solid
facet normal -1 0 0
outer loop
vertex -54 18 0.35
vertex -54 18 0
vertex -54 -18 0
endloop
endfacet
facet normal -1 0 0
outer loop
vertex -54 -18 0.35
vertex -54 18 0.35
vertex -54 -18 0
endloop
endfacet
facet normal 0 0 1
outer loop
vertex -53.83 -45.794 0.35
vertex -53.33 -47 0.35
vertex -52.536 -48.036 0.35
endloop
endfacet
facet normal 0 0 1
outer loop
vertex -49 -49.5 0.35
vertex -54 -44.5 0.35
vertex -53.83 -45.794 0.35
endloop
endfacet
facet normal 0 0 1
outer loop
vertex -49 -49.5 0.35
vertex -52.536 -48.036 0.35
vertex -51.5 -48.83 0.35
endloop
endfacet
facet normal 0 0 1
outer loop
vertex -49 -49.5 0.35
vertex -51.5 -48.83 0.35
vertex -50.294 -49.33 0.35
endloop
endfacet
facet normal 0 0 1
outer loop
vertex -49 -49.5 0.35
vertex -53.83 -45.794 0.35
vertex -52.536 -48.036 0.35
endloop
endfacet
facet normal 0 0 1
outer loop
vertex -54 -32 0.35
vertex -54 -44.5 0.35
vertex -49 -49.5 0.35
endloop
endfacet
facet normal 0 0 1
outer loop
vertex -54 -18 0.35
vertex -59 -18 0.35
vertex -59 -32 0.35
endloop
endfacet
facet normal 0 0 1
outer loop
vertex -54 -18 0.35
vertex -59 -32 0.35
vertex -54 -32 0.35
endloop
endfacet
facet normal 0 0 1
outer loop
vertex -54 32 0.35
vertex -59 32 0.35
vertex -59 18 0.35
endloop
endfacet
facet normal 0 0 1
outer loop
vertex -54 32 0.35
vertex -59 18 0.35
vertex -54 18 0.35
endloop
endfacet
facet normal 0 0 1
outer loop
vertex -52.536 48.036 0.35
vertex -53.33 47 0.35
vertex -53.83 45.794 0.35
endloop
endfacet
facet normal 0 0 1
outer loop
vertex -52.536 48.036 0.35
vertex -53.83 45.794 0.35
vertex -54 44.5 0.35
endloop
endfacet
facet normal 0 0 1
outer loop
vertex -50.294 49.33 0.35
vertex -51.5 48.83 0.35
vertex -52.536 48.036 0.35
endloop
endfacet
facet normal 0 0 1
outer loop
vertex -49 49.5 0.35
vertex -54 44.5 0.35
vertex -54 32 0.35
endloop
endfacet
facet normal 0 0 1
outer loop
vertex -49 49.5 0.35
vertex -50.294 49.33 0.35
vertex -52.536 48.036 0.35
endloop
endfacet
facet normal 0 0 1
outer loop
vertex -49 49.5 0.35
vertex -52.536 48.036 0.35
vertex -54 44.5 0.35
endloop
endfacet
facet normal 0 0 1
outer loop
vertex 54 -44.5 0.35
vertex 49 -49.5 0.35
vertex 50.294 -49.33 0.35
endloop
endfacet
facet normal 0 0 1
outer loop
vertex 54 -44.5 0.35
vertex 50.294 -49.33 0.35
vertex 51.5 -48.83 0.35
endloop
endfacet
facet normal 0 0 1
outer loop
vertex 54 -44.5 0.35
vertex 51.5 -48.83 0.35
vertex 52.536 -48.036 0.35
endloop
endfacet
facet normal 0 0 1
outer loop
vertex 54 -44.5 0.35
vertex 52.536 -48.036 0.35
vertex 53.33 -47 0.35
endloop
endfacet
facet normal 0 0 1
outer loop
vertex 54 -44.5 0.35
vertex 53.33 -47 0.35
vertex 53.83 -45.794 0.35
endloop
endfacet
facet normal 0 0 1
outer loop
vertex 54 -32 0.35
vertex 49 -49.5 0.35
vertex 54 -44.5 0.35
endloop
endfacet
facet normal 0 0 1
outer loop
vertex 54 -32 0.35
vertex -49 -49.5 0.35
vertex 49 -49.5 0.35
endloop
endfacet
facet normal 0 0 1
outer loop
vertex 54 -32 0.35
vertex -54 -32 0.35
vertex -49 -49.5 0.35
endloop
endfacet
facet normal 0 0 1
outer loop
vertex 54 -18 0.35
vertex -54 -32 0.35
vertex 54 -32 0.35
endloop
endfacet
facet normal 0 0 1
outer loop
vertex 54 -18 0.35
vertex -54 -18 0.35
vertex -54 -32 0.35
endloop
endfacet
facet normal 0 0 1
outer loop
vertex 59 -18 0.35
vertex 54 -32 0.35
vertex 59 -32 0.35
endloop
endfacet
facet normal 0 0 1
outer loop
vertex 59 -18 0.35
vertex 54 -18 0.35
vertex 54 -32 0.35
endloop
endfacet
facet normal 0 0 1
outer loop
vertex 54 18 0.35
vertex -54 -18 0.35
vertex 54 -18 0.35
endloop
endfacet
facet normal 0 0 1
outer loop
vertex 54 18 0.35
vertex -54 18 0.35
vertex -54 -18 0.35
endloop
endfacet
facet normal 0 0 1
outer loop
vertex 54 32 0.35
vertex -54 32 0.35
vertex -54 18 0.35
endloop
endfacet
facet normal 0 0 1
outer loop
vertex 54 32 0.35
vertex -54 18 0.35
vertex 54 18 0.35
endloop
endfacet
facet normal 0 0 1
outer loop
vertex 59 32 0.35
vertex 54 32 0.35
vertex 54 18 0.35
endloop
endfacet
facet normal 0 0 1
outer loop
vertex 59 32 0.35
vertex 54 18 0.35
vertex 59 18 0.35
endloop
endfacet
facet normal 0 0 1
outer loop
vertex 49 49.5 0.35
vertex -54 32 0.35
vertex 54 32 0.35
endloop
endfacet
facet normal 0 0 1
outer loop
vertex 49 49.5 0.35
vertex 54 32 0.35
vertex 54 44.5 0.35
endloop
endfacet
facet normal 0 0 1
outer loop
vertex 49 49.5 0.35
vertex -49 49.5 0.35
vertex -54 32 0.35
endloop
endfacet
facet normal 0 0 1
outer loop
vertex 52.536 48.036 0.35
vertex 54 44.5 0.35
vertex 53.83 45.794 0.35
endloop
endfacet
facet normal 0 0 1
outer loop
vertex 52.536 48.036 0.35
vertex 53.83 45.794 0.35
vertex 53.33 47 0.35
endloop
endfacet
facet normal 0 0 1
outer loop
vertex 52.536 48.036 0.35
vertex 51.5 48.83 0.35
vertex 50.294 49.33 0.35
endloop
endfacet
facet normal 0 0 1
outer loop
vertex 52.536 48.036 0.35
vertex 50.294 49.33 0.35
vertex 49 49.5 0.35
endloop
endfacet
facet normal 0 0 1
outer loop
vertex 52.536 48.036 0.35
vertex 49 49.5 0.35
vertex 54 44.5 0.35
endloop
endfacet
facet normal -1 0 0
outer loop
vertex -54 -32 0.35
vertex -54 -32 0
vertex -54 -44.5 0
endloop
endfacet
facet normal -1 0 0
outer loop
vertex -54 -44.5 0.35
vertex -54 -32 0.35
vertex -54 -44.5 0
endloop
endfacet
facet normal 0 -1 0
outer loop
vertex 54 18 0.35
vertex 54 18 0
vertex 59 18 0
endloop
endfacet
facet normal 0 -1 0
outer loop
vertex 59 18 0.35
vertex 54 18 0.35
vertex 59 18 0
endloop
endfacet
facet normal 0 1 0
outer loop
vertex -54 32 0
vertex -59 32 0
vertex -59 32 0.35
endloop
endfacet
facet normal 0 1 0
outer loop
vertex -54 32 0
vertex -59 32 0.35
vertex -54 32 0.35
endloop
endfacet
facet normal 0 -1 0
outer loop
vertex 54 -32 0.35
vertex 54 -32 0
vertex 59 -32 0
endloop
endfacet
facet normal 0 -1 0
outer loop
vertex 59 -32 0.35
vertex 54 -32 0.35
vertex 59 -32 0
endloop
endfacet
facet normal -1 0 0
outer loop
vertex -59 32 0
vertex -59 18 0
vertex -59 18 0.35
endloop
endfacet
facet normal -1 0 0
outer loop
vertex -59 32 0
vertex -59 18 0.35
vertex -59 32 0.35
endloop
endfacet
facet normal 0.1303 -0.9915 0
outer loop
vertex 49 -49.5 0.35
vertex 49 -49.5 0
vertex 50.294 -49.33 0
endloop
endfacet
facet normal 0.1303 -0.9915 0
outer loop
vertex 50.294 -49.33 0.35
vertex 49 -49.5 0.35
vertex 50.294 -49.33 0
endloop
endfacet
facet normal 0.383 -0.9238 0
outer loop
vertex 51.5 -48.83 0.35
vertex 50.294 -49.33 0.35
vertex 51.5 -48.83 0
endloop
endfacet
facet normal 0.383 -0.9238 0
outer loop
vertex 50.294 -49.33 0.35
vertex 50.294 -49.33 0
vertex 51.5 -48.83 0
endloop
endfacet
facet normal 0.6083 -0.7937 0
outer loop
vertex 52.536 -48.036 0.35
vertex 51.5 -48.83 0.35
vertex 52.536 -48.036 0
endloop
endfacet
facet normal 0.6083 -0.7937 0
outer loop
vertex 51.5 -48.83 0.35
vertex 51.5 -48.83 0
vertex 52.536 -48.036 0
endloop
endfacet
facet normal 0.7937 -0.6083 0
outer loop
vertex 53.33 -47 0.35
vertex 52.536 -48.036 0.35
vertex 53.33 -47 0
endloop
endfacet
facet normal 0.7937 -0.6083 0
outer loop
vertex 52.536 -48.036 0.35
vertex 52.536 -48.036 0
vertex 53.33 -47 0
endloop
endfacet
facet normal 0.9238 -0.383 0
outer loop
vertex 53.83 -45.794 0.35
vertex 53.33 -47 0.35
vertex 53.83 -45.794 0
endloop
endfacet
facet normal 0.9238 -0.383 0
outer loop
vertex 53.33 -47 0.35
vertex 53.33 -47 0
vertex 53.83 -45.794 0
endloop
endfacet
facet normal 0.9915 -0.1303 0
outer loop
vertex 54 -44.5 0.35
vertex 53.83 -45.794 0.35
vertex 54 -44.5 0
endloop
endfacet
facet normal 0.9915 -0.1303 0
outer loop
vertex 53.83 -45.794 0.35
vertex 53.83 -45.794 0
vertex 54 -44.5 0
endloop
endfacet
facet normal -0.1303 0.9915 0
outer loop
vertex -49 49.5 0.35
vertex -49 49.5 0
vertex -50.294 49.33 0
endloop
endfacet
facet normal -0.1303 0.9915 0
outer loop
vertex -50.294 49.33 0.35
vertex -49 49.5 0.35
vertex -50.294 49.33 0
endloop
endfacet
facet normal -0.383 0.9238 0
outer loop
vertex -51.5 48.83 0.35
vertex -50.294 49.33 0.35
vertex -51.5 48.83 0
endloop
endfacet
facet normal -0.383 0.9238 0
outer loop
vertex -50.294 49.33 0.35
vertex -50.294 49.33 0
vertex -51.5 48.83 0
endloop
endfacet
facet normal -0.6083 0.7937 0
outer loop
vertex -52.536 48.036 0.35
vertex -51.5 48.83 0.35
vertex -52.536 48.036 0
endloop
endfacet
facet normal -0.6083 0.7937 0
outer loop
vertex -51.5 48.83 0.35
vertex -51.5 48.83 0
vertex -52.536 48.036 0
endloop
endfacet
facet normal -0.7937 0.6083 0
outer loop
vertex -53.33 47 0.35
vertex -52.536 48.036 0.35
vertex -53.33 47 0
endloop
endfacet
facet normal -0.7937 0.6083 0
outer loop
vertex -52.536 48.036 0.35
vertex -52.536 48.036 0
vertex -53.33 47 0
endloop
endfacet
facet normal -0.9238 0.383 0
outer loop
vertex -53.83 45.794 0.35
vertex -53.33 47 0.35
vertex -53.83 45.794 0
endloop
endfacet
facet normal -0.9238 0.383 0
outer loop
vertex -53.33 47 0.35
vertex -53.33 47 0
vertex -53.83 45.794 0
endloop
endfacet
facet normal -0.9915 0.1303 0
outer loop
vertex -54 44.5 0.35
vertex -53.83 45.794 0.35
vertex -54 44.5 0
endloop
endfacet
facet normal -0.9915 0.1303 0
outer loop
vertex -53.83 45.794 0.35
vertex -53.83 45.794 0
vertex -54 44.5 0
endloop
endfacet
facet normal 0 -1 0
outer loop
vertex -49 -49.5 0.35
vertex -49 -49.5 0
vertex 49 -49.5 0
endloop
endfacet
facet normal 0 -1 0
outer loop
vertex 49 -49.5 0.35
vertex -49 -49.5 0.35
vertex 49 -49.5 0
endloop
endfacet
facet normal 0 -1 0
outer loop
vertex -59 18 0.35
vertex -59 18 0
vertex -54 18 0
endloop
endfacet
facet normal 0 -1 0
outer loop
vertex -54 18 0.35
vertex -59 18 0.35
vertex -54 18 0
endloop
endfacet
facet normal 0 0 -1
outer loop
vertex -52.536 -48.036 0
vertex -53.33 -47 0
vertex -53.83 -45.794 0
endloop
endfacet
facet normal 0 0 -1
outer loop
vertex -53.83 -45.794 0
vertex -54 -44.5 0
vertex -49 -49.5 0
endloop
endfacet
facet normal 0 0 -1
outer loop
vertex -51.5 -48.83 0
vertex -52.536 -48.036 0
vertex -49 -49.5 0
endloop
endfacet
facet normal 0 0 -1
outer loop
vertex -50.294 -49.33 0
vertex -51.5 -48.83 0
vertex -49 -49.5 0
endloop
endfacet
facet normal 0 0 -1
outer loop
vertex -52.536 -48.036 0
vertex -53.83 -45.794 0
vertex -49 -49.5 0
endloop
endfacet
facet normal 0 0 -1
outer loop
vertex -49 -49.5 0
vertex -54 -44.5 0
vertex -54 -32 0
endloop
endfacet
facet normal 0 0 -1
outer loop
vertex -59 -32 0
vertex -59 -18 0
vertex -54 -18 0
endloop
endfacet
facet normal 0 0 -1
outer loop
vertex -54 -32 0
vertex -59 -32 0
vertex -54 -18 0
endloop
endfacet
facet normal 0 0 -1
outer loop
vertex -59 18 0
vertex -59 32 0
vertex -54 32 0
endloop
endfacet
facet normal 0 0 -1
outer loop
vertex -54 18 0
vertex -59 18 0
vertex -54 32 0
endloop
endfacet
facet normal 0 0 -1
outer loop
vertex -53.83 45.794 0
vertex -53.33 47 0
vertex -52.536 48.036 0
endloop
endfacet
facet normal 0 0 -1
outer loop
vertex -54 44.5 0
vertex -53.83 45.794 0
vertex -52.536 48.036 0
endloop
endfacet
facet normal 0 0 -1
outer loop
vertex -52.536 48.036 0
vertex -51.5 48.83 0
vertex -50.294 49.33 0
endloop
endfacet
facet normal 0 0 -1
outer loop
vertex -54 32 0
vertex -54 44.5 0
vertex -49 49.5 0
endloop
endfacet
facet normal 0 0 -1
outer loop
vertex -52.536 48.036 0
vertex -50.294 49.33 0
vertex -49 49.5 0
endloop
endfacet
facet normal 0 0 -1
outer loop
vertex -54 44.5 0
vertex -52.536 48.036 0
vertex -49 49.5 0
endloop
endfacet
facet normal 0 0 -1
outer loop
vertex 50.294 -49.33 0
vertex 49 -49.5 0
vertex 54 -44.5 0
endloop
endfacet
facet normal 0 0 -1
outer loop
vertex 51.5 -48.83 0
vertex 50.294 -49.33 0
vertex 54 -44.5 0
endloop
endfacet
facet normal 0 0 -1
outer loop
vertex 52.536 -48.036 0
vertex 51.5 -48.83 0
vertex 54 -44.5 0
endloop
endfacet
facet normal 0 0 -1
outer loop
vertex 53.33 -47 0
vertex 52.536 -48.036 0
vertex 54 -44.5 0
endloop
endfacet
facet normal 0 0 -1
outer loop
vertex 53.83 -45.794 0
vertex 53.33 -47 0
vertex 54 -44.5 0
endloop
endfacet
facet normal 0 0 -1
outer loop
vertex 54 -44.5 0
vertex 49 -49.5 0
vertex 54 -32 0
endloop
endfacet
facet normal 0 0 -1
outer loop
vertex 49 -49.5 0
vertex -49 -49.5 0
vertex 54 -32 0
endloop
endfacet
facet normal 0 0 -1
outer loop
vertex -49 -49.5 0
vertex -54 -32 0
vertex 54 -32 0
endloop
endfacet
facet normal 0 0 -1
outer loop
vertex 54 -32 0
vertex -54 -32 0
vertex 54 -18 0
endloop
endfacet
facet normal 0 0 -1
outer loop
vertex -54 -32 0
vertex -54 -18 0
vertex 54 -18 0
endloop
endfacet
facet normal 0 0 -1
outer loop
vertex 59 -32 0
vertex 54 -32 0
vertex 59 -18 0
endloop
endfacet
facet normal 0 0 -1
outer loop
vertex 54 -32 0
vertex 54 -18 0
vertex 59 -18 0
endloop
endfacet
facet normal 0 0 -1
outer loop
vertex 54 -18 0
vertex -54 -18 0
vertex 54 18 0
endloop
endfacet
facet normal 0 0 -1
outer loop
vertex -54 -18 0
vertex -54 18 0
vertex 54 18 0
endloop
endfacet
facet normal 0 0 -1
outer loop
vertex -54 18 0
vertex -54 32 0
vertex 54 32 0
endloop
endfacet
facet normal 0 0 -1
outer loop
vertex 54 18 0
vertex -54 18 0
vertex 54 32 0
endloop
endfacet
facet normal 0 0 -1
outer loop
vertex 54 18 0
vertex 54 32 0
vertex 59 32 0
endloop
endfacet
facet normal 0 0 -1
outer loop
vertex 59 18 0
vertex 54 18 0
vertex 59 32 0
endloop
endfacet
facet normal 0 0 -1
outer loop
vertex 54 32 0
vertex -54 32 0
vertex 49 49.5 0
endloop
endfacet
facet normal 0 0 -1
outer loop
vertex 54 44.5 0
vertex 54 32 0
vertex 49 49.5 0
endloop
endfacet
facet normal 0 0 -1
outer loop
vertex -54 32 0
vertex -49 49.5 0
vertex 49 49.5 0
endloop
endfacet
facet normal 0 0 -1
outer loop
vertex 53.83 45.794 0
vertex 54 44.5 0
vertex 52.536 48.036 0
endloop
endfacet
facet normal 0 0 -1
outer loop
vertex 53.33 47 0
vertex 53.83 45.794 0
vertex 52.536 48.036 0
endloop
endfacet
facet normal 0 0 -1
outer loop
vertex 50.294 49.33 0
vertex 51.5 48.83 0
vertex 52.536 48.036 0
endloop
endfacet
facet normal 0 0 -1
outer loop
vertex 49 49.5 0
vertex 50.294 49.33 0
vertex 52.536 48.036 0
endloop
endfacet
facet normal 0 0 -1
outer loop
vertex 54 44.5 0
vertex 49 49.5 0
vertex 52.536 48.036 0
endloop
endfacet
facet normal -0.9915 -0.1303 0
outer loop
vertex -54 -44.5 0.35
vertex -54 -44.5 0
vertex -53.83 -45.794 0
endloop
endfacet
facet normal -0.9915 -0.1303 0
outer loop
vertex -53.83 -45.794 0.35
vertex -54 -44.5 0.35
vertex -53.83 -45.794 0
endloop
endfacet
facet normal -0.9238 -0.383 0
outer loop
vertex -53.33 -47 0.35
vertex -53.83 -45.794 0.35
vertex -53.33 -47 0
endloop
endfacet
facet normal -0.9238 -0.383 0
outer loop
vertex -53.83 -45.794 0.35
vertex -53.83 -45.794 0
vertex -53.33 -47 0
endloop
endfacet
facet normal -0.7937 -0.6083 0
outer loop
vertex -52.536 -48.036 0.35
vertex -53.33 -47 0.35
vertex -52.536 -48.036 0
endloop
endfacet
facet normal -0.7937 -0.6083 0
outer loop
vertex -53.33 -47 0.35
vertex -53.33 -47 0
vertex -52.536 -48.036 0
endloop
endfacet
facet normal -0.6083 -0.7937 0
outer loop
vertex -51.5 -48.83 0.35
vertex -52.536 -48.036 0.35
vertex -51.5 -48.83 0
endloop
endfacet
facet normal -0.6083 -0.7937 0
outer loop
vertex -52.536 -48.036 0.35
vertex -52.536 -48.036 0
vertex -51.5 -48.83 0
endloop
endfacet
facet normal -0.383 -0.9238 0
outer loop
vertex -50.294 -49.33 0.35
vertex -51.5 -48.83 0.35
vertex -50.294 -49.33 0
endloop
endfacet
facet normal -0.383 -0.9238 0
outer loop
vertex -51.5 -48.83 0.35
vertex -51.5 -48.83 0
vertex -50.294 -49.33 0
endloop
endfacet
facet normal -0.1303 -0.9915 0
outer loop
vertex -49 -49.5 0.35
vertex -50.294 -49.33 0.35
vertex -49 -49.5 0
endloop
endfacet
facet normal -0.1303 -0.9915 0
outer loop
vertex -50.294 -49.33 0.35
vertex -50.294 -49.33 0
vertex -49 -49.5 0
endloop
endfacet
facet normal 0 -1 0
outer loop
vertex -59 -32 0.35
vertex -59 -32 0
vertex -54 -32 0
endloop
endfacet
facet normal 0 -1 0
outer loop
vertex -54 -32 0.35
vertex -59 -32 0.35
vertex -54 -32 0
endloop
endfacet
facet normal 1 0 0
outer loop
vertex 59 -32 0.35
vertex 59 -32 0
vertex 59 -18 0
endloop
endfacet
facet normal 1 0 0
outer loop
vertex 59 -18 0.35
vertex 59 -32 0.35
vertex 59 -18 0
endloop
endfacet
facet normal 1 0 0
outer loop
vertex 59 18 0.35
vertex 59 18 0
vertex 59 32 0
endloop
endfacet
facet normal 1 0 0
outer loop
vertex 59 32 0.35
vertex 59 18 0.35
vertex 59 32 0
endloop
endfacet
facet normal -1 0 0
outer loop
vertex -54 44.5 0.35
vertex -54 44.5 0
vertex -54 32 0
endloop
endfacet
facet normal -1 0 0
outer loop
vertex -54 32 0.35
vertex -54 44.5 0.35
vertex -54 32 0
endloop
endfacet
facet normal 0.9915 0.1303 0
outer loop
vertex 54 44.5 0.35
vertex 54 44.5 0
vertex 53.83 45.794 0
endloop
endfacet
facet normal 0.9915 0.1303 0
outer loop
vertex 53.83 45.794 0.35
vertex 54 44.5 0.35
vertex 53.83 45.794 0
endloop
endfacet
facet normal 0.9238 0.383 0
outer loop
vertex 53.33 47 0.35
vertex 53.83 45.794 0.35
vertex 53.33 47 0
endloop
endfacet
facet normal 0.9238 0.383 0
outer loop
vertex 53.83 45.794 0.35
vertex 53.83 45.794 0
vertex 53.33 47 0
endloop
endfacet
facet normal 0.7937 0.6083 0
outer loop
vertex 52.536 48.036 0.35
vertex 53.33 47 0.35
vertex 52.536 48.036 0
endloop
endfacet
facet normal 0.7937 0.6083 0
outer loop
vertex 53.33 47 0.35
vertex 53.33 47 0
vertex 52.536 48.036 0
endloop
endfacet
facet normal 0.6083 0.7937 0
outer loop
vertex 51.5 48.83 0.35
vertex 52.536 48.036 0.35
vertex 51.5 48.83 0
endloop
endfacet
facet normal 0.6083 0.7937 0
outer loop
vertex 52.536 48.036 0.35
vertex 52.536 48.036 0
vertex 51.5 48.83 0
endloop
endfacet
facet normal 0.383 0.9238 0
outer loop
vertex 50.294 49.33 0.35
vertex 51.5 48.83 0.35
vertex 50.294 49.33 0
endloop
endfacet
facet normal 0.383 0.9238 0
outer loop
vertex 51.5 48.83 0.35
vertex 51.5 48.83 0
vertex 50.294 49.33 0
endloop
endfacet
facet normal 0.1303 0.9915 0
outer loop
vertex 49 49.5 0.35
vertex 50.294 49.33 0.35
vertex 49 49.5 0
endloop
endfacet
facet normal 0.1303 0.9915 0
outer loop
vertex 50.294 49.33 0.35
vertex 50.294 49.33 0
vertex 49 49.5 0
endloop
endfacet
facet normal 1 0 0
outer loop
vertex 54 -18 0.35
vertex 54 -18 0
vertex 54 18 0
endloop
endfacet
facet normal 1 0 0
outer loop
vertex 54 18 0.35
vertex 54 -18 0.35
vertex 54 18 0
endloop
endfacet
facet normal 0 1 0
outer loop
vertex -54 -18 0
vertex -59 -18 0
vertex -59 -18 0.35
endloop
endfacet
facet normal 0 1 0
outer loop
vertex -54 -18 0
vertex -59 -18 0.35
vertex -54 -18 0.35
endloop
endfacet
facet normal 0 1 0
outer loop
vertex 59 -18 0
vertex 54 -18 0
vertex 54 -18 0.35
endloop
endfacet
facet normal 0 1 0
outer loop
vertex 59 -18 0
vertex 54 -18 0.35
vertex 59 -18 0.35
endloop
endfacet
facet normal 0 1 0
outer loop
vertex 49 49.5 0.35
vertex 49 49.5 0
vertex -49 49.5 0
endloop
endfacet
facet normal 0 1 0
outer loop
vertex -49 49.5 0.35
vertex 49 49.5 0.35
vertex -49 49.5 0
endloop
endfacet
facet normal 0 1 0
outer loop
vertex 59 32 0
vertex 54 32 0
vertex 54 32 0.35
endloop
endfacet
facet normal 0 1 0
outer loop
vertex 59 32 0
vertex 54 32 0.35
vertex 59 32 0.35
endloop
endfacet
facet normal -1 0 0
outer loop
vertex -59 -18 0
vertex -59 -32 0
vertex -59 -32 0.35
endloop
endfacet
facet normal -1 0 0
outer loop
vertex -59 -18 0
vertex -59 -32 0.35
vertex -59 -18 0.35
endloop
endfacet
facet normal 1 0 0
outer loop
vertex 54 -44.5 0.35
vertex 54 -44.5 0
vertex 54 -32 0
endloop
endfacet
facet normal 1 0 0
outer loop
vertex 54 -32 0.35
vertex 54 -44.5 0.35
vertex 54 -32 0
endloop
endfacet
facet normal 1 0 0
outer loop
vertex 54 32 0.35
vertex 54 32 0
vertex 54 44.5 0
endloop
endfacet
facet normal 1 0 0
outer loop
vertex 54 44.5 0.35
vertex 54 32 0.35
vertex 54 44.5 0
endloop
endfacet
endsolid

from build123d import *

# Parameters (mm, degrees)
F0_W     = 5
F0_H     = 14
F0_W_2   = 108
F1_DEPTH = 0.35


with BuildPart() as f1:
    # F0 (on Top) → F1 (new body)
    with BuildSketch(Plane.XY):
        with BuildLine():
            ThreePointArc((54, 44.5), (52.5355339059, 48.0355339059), (49, 49.5))
            Line((49, 49.5), (-49, 49.5))
            ThreePointArc((-49, 49.5), (-52.5355339059, 48.0355339059), (-54, 44.5))
            Line((-54, 44.5), (-54, 32))
            Line((-54, 32), (54, 32))
            Line((54, 32), (54, 44.5))
        make_face()
        with Locations((56.5, 25)):
            Rectangle(F0_W, F0_H)
        Polygon((54, 18), (54, 32), (-54, 32), (-54, 18), (0, 18), align=None)
        with Locations((-56.5, 25)):
            Rectangle(F0_W, F0_H)
        Polygon((54, -18), (54, 18), (0, 18), (-54, 18), (-54, -18), align=None)
        with Locations((56.5, -25)):
            Rectangle(F0_W, F0_H)
        with Locations((0, -25)):
            Rectangle(F0_W_2, F0_H)
        with Locations((-56.5, -25)):
            Rectangle(F0_W, F0_H)
        with BuildLine():
            Line((54, -44.5), (54, -32))
            Line((54, -32), (-54, -32))
            Line((-54, -32), (-54, -44.5))
            ThreePointArc((-54, -44.5), (-52.5355339059, -48.0355339059), (-49, -49.5))
            Line((-49, -49.5), (49, -49.5))
            ThreePointArc((49, -49.5), (52.5355339059, -48.0355339059), (54, -44.5))
        make_face()
    extrude(amount=F1_DEPTH)


solid = f1.part
